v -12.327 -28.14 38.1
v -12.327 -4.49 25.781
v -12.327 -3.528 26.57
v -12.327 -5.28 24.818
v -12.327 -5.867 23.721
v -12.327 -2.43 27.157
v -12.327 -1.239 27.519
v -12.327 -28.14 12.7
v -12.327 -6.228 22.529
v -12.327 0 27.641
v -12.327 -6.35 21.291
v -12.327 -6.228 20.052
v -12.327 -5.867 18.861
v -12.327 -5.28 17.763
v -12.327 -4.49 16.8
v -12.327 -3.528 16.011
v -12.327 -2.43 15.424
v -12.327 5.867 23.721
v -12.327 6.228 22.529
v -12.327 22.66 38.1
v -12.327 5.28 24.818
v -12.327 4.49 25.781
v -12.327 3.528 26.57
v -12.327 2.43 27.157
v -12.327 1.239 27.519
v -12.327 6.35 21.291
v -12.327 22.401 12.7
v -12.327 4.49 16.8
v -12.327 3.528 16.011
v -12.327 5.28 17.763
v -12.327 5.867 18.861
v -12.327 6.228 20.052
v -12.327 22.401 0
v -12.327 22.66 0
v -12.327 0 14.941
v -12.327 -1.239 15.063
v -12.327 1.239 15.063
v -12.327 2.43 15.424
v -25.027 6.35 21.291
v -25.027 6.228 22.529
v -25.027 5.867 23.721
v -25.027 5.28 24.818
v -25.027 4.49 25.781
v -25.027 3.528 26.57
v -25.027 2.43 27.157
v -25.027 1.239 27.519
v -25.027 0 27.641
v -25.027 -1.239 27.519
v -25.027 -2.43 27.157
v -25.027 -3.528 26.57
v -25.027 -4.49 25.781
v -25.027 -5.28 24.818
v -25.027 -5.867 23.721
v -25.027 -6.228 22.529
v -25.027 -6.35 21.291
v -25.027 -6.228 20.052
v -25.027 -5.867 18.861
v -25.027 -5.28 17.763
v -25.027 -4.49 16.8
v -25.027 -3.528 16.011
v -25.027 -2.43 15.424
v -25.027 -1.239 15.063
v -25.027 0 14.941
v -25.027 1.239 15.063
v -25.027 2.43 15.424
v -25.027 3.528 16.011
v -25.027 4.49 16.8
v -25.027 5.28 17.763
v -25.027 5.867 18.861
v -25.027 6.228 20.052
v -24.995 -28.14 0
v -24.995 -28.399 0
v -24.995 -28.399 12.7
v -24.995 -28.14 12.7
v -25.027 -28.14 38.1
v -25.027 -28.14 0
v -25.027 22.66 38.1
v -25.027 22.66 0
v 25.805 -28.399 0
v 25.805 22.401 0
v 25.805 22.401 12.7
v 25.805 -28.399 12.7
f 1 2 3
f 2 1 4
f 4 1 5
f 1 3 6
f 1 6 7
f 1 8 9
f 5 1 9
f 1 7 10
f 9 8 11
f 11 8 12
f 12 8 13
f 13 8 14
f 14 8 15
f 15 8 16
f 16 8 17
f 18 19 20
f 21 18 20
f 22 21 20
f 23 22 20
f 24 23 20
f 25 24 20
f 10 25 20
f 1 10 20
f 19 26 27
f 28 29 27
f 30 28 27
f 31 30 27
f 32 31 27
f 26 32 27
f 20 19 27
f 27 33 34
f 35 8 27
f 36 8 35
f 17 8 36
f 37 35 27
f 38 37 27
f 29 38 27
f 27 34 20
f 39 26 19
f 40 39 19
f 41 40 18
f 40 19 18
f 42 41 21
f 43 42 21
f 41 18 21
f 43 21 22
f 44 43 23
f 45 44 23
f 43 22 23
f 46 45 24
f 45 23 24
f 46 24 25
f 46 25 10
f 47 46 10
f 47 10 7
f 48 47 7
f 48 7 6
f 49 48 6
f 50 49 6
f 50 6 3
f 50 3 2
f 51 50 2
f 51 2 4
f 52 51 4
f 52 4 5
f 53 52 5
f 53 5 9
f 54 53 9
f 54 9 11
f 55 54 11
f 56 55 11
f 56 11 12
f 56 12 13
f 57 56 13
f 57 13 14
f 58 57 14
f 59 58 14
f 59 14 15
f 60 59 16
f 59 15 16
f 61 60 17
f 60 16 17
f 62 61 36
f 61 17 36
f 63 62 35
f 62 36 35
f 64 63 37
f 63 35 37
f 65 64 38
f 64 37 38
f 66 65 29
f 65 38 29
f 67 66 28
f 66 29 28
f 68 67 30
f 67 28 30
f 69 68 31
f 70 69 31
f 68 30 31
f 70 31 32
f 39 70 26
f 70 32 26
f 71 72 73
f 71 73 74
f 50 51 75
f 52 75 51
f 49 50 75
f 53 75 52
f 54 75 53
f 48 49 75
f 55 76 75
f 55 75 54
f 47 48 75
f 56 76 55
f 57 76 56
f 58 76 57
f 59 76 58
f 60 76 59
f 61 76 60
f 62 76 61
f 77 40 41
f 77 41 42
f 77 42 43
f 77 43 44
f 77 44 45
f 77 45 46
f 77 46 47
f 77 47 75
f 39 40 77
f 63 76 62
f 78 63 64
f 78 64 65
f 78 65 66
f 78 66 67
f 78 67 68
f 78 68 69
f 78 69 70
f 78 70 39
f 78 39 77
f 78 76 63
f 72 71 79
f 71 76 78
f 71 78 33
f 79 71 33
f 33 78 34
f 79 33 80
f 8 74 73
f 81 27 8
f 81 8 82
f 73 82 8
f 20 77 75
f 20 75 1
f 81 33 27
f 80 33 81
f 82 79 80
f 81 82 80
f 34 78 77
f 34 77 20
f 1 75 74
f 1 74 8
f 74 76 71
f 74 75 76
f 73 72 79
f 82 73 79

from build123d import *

# Parameters (mm, degrees)
F0_W     = 50.8
F0_H     = 50.8
F1_DEPTH = 12.7
F2_W     = 12.7
F2_H     = 50.8
F3_DEPTH = 38.1
F5_D     = 12.7


with BuildPart() as f1:
    # F0 (on Top) → F1 (new body)
    with BuildSketch(Plane.XY):
        with Locations((0.405492, -2.999011)):
            Rectangle(F0_W, F0_H)
    extrude(amount=F1_DEPTH)

    # F2 (on Top) → F3 (join)
    with BuildSketch(Plane.XY):
        with Locations((-18.677441, -2.73966)):
            Rectangle(F2_W, F2_H)
    extrude(amount=F3_DEPTH)

    # F5 (through all)
    with Locations(Plane(origin=(-25.027441, 0, 0), x_dir=(0, -1, 0), z_dir=(-1, 0, 0))):
        with Locations((0, 21.290614)):
            Hole(F5_D / 2)


solid = f1.part
